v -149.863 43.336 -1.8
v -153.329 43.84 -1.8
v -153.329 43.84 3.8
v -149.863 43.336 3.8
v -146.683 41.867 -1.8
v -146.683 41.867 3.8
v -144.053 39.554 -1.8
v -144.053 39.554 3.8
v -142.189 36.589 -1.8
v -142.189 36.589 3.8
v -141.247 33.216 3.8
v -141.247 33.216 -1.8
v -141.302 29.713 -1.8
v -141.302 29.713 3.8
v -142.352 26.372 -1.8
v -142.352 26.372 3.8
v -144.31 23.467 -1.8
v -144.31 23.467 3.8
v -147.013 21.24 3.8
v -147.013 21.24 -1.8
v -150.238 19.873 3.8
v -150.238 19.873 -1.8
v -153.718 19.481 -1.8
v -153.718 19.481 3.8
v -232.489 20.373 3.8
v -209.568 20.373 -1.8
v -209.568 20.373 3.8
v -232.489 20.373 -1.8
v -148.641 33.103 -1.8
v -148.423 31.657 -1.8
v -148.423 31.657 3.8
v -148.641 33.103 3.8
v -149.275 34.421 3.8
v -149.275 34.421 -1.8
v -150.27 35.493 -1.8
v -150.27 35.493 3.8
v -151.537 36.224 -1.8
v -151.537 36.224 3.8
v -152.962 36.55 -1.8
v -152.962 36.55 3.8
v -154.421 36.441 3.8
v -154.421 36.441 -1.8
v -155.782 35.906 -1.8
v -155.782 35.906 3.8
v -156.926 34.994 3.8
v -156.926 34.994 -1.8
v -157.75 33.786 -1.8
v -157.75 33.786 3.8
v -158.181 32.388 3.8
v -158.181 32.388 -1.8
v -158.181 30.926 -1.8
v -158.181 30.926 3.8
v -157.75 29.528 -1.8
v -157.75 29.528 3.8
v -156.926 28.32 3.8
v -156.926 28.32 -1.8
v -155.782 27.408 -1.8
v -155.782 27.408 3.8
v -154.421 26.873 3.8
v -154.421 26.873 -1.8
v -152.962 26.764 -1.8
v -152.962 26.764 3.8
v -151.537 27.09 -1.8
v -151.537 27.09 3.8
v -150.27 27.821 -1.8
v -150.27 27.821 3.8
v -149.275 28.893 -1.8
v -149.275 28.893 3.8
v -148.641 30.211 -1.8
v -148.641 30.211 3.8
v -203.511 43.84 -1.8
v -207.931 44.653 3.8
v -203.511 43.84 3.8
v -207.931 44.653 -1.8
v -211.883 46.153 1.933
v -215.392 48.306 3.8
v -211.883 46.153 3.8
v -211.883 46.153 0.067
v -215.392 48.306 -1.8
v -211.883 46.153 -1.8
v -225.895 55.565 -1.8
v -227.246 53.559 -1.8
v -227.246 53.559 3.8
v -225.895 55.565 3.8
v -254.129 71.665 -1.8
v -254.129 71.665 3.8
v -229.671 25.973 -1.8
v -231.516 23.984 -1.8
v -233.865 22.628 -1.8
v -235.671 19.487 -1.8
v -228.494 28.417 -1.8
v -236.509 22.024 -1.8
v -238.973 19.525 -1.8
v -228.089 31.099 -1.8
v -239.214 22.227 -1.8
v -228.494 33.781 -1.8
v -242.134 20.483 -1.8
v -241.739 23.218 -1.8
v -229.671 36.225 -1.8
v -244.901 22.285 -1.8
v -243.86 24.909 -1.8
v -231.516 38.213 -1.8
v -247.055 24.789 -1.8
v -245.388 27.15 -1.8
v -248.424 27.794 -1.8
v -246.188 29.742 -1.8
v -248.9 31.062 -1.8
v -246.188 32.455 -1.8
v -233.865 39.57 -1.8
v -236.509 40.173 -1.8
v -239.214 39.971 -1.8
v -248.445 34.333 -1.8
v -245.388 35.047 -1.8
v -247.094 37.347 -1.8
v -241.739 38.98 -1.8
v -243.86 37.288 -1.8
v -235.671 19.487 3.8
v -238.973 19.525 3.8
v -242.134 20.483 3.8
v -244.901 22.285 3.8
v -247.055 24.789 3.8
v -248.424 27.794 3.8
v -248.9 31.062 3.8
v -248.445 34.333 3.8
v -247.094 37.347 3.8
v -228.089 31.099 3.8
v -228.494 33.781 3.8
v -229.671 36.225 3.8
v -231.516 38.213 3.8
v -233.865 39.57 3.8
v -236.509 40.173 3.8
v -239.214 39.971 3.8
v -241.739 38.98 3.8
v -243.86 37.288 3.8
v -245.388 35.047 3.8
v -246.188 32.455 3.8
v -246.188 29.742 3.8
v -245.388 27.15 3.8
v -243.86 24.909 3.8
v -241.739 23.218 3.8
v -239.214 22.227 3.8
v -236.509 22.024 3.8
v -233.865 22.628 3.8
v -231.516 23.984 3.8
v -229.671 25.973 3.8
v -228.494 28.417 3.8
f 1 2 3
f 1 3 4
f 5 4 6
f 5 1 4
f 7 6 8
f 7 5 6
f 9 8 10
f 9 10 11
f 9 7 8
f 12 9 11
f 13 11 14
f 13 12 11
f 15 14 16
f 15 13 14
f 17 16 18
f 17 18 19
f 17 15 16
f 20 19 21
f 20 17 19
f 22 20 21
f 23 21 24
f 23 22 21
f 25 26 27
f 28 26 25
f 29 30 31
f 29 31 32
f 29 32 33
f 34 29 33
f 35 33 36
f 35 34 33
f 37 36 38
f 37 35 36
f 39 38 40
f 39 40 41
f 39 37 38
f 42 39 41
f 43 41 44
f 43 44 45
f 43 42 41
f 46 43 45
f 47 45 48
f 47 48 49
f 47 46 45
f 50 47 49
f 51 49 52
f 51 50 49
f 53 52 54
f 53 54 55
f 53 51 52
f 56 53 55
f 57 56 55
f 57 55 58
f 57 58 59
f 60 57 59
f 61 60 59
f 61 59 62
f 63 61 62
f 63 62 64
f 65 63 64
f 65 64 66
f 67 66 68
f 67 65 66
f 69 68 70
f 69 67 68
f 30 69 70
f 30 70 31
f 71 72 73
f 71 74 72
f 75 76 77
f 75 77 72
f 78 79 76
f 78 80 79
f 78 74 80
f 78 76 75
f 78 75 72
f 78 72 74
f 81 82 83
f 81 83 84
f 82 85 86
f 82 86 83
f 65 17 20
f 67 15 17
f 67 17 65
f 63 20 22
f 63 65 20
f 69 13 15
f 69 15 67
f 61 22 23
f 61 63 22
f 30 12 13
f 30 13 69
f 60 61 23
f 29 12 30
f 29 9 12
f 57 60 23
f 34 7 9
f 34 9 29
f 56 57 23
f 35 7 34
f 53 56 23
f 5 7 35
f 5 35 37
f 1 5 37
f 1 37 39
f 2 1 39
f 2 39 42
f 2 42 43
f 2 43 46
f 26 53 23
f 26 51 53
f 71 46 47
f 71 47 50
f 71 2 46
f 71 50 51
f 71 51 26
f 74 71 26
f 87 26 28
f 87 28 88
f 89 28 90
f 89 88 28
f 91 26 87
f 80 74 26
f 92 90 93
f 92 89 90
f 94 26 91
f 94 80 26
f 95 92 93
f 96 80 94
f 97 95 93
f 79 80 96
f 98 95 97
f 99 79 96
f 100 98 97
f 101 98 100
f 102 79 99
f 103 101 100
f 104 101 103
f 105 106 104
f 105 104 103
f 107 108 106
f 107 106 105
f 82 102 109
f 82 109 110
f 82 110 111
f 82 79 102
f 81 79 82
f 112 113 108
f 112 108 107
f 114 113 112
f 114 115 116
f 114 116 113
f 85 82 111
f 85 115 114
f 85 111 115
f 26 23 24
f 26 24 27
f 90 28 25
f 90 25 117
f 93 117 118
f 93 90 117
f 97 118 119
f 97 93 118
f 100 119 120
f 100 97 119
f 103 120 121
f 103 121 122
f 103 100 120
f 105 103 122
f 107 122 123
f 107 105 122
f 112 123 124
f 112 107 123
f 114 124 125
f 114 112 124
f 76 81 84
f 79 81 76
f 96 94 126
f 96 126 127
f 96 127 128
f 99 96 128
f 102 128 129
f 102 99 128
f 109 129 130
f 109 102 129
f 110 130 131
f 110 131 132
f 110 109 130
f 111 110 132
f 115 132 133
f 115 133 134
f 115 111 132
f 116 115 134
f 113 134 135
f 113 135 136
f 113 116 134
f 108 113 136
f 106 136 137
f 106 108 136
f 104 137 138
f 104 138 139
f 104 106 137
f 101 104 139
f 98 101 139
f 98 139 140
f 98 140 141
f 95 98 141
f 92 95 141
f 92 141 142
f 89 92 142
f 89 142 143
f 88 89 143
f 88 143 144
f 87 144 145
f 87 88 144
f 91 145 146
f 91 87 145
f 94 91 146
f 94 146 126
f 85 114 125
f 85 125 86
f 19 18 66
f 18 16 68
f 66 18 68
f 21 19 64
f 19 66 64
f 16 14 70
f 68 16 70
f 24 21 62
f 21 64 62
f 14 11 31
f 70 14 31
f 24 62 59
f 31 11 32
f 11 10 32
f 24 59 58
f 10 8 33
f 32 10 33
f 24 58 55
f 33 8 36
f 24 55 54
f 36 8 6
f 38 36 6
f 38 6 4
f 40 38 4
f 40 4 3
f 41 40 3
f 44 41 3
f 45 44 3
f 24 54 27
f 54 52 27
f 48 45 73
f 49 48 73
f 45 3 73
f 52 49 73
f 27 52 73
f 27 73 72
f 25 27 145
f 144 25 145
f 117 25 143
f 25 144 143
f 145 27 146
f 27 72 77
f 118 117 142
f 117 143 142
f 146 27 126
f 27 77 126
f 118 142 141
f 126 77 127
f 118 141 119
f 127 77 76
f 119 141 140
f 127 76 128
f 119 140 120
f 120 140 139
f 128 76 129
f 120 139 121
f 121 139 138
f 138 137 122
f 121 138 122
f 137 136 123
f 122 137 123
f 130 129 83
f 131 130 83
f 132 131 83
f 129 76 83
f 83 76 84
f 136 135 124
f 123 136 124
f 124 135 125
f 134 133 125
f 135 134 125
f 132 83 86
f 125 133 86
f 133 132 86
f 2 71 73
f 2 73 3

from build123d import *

# Parameters (mm, degrees)
SKETCH1_R           = 1.752344144
SKETCH1_R_2         = 3.25
BOSS_EXTRUDE1_DEPTH = 2
SCALE6_SCALE        = 2.8


with BuildPart() as part:
    # Sketch1 → Boss-Extrude1 (new body)
    with BuildSketch(Plane.XY):
        with BuildLine():
            Line((-201.779102887, 38.968850302), (-183.856871997, 38.968850302))
            ThreePointArc((-183.856871997, 38.968850302), (-179.50647719, 34.548425149), (-183.995805524, 30.26917))
            Line((-183.995805524, 30.26917), (-203.942326715, 30.587715102))
            Line((-203.942326715, 30.587715102), (-212.128411179, 30.587715102))
            ThreePointArc((-212.128411179, 30.587715102), (-216.977472251, 31.690715611), (-217.344366931, 36.650089735))
            Line((-217.344366931, 36.650089735), (-219.856871997, 48.906588317))
            Line((-219.856871997, 48.906588317), (-210.255760435, 42.440195681))
            Line((-210.255760435, 42.440195681), (-209.773273317, 43.15651595))
            Line((-209.773273317, 43.15651595), (-206.022177555, 40.564020545))
            add(Edge.make_bspline(
                [(-206.022177555, 40.564020545), (-204.845604067, 39.682708979), (-203.443834564, 39.1324171), (-201.779102887, 38.968850302)],
                knots=[0.24, 0.24, 0.24, 0.24, 0.28, 0.28, 0.28, 0.28], degree=3))
        make_face()
        with Locations((-183.856871997, 34.61790077)):
            Circle(SKETCH1_R, mode=Mode.SUBTRACT)
        with Locations((-213.807007526, 34.418525211)):
            Circle(SKETCH1_R_2, mode=Mode.SUBTRACT)
    extrude(amount=BOSS_EXTRUDE1_DEPTH)


with BuildPart() as part_1:
    # Scale6: scaled about (-200.816753652, 36.262830965, 1)
    add(part.part.scale(SCALE6_SCALE).moved(Location((361.470156574, -65.273095737, -1.8))))


solid = part_1.part
